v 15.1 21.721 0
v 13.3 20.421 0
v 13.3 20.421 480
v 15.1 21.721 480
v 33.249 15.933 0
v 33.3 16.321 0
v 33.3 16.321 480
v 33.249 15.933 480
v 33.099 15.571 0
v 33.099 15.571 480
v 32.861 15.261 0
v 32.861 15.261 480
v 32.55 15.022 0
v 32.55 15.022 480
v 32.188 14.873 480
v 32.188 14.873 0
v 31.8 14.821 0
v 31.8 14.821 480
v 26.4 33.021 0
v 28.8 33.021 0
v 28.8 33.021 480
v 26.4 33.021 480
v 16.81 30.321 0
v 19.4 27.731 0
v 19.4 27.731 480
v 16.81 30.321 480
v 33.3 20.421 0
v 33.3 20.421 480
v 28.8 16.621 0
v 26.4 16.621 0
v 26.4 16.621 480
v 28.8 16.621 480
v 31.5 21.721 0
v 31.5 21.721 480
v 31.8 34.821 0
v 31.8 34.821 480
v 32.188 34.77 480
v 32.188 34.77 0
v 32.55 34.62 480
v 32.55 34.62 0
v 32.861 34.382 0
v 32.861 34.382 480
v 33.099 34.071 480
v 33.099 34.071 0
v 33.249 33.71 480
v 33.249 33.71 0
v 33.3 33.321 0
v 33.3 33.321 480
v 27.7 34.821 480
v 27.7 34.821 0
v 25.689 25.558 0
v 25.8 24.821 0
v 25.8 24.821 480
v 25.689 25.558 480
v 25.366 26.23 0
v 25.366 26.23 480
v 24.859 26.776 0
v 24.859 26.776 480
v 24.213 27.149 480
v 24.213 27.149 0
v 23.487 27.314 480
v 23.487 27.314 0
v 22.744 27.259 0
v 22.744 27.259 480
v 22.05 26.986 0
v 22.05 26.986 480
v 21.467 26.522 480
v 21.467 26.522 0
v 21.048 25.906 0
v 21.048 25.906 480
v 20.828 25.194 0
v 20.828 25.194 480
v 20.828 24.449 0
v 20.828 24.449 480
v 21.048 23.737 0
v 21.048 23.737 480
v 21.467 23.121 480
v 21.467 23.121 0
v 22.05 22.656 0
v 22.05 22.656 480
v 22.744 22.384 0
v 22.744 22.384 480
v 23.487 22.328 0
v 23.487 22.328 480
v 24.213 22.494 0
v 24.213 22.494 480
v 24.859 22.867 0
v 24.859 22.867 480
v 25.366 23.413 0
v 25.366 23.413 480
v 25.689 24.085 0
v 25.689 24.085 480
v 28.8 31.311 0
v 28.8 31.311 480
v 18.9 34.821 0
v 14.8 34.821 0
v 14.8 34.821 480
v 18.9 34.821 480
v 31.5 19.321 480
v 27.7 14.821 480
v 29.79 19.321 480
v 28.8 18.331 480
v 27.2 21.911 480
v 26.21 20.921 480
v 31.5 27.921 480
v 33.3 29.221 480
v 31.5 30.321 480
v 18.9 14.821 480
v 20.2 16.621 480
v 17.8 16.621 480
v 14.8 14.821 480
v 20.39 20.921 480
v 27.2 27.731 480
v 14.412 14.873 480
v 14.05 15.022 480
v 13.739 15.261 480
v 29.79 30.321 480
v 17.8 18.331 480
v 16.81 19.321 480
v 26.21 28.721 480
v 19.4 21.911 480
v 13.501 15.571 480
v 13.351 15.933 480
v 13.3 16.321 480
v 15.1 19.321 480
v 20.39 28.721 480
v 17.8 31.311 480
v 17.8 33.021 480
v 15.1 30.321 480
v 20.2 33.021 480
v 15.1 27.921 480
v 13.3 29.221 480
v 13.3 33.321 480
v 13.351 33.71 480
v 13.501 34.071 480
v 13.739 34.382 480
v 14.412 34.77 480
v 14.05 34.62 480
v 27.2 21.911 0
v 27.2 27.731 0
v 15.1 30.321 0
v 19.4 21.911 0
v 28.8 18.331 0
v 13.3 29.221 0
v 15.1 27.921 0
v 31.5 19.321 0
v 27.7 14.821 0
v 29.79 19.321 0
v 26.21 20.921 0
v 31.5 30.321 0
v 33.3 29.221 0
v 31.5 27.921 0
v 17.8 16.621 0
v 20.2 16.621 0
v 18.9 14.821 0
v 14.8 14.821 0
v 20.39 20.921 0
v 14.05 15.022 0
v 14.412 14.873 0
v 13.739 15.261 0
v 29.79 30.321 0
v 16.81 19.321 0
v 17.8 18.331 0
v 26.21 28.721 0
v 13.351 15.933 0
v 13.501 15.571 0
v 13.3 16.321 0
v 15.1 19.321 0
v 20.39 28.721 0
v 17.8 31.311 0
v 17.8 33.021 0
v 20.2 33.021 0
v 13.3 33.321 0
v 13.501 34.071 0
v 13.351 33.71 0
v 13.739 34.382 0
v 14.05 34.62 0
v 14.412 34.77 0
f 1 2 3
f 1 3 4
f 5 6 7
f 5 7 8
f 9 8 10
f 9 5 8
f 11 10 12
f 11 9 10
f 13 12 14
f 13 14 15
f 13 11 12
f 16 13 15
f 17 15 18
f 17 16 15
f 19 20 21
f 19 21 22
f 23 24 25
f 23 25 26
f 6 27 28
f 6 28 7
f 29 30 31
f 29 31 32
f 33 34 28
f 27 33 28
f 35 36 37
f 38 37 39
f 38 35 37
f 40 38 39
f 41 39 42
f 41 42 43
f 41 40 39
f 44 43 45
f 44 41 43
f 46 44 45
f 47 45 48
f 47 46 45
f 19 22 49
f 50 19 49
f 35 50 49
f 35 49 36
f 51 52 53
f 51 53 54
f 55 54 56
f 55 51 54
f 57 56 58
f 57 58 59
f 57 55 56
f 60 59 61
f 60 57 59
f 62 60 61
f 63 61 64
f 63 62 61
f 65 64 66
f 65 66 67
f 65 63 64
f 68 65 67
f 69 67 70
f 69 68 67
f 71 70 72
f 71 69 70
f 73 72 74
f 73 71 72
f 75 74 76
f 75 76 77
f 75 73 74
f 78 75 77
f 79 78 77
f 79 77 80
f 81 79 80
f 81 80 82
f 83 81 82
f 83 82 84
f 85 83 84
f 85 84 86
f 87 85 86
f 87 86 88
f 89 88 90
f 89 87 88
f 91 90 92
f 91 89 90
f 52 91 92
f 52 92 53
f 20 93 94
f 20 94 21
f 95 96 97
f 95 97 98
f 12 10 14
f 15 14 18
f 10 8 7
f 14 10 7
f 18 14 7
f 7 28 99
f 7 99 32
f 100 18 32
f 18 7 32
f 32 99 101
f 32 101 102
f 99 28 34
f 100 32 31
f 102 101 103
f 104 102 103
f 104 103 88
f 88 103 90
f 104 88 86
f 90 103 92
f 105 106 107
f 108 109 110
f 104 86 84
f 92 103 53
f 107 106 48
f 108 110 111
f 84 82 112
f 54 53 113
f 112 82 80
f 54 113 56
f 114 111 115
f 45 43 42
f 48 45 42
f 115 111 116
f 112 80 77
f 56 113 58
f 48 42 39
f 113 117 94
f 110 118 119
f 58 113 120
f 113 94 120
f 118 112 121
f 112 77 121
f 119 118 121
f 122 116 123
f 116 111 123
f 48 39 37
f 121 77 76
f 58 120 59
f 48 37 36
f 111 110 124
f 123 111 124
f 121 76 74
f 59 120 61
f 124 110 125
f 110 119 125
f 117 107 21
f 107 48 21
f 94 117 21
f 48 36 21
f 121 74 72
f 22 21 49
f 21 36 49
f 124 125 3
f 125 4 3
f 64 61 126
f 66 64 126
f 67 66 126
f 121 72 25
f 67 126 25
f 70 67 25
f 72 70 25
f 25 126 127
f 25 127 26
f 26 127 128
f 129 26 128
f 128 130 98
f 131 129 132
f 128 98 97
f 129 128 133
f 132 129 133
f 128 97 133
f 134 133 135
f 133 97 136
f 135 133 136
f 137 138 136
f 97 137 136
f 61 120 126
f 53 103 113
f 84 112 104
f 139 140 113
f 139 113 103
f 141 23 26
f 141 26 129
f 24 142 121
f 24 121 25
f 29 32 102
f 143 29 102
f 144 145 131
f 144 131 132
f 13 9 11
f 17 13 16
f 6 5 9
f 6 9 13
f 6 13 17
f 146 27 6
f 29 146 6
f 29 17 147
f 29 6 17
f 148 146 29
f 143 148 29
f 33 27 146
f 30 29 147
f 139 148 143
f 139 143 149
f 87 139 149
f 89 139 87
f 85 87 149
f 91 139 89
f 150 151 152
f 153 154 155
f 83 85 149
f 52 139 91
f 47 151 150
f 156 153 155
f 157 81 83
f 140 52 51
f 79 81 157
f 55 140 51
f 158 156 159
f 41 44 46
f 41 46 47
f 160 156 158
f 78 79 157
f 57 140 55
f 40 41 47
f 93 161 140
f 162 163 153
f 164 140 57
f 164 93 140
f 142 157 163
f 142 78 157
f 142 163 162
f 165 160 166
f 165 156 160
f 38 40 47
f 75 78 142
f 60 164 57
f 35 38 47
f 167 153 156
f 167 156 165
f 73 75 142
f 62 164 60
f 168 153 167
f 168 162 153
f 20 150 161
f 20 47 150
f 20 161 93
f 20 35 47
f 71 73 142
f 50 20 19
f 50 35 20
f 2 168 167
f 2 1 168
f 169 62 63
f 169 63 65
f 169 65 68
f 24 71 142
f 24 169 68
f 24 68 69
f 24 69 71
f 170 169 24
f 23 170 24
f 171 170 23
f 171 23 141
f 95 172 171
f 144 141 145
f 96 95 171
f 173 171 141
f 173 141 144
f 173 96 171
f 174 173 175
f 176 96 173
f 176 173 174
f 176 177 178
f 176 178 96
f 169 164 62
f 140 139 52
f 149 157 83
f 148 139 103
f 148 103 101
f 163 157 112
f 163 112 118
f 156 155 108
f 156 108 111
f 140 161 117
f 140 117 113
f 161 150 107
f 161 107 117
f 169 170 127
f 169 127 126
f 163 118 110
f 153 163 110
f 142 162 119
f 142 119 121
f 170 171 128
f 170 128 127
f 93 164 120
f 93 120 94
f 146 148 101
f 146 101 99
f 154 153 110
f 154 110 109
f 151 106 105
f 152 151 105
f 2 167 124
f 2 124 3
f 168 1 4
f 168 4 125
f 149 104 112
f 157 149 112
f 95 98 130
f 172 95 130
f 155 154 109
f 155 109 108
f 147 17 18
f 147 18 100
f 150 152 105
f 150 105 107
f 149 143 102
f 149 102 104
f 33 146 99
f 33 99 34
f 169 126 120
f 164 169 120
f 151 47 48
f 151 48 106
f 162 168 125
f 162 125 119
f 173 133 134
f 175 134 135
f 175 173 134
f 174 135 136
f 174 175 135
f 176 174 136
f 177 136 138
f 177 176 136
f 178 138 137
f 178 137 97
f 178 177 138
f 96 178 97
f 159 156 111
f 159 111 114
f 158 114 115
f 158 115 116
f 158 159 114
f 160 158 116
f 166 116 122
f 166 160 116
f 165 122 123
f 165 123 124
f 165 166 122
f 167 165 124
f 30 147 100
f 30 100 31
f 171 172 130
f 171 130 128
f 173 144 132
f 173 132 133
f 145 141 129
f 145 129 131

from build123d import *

# Parameters (mm, degrees)
SKETCH_1_R      = 2.5
EXTRUDE_1_DEPTH = 480


with BuildPart() as part:
    # 草图1 → 凸台-拉伸1 (new body)
    with BuildSketch(Plane.XY):
        with BuildLine():
            Line((14.8, 34.821428571), (18.9, 34.821428571))
            Line((18.9, 34.821428571), (20.2, 33.021428571))
            Line((20.2, 33.021428571), (17.8, 33.021428571))
            Line((17.8, 33.021428571), (17.8, 31.311378065))
            Line((17.8, 31.311378065), (20.389949494, 28.721428571))
            Line((20.389949494, 28.721428571), (26.210050506, 28.721428571))
            Line((26.210050506, 28.721428571), (28.8, 31.311378065))
            Line((28.8, 31.311378065), (28.8, 33.021428571))
            Line((28.8, 33.021428571), (26.4, 33.021428571))
            Line((26.4, 33.021428571), (27.7, 34.821428571))
            Line((27.7, 34.821428571), (31.8, 34.821428571))
            ThreePointArc((31.8, 34.821428571), (32.860660172, 34.382088743), (33.3, 33.321428571))
            Line((33.3, 33.321428571), (33.3, 29.221428571))
            Line((33.3, 29.221428571), (31.5, 27.921428571))
            Line((31.5, 27.921428571), (31.5, 30.321428571))
            Line((31.5, 30.321428571), (29.789949494, 30.321428571))
            Line((29.789949494, 30.321428571), (27.2, 27.731479078))
            Line((27.2, 27.731479078), (27.2, 21.911378065))
            Line((27.2, 21.911378065), (29.789949494, 19.321428571))
            Line((29.789949494, 19.321428571), (31.5, 19.321428571))
            Line((31.5, 19.321428571), (31.5, 21.721428571))
            Line((31.5, 21.721428571), (33.3, 20.421428571))
            Line((33.3, 20.421428571), (33.3, 16.321428571))
            ThreePointArc((33.3, 16.321428571), (32.860660172, 15.2607684), (31.8, 14.821428571))
            Line((31.8, 14.821428571), (27.7, 14.821428571))
            Line((27.7, 14.821428571), (26.4, 16.621428571))
            Line((26.4, 16.621428571), (28.8, 16.621428571))
            Line((28.8, 16.621428571), (28.8, 18.331479078))
            Line((28.8, 18.331479078), (26.210050506, 20.921428571))
            Line((26.210050506, 20.921428571), (20.389949494, 20.921428571))
            Line((20.389949494, 20.921428571), (17.8, 18.331479078))
            Line((17.8, 18.331479078), (17.8, 16.621428571))
            Line((17.8, 16.621428571), (20.2, 16.621428571))
            Line((20.2, 16.621428571), (18.9, 14.821428571))
            Line((18.9, 14.821428571), (14.8, 14.821428571))
            ThreePointArc((14.8, 14.821428571), (13.739339828, 15.2607684), (13.3, 16.321428571))
            Line((13.3, 16.321428571), (13.3, 20.421428571))
            Line((13.3, 20.421428571), (15.1, 21.721428571))
            Line((15.1, 21.721428571), (15.1, 19.321428571))
            Line((15.1, 19.321428571), (16.810050506, 19.321428571))
            Line((16.810050506, 19.321428571), (19.4, 21.911378065))
            Line((19.4, 21.911378065), (19.4, 27.731479078))
            Line((19.4, 27.731479078), (16.810050506, 30.321428571))
            Line((16.810050506, 30.321428571), (15.1, 30.321428571))
            Line((15.1, 30.321428571), (15.1, 27.921428571))
            Line((15.1, 27.921428571), (13.3, 29.221428571))
            Line((13.3, 29.221428571), (13.3, 33.321428571))
            ThreePointArc((13.3, 33.321428571), (13.739339828, 34.382088743), (14.8, 34.821428571))
        make_face()
        with Locations((23.3, 24.821428571)):
            Circle(SKETCH_1_R, mode=Mode.SUBTRACT)
    extrude(amount=EXTRUDE_1_DEPTH)


solid = part.part
